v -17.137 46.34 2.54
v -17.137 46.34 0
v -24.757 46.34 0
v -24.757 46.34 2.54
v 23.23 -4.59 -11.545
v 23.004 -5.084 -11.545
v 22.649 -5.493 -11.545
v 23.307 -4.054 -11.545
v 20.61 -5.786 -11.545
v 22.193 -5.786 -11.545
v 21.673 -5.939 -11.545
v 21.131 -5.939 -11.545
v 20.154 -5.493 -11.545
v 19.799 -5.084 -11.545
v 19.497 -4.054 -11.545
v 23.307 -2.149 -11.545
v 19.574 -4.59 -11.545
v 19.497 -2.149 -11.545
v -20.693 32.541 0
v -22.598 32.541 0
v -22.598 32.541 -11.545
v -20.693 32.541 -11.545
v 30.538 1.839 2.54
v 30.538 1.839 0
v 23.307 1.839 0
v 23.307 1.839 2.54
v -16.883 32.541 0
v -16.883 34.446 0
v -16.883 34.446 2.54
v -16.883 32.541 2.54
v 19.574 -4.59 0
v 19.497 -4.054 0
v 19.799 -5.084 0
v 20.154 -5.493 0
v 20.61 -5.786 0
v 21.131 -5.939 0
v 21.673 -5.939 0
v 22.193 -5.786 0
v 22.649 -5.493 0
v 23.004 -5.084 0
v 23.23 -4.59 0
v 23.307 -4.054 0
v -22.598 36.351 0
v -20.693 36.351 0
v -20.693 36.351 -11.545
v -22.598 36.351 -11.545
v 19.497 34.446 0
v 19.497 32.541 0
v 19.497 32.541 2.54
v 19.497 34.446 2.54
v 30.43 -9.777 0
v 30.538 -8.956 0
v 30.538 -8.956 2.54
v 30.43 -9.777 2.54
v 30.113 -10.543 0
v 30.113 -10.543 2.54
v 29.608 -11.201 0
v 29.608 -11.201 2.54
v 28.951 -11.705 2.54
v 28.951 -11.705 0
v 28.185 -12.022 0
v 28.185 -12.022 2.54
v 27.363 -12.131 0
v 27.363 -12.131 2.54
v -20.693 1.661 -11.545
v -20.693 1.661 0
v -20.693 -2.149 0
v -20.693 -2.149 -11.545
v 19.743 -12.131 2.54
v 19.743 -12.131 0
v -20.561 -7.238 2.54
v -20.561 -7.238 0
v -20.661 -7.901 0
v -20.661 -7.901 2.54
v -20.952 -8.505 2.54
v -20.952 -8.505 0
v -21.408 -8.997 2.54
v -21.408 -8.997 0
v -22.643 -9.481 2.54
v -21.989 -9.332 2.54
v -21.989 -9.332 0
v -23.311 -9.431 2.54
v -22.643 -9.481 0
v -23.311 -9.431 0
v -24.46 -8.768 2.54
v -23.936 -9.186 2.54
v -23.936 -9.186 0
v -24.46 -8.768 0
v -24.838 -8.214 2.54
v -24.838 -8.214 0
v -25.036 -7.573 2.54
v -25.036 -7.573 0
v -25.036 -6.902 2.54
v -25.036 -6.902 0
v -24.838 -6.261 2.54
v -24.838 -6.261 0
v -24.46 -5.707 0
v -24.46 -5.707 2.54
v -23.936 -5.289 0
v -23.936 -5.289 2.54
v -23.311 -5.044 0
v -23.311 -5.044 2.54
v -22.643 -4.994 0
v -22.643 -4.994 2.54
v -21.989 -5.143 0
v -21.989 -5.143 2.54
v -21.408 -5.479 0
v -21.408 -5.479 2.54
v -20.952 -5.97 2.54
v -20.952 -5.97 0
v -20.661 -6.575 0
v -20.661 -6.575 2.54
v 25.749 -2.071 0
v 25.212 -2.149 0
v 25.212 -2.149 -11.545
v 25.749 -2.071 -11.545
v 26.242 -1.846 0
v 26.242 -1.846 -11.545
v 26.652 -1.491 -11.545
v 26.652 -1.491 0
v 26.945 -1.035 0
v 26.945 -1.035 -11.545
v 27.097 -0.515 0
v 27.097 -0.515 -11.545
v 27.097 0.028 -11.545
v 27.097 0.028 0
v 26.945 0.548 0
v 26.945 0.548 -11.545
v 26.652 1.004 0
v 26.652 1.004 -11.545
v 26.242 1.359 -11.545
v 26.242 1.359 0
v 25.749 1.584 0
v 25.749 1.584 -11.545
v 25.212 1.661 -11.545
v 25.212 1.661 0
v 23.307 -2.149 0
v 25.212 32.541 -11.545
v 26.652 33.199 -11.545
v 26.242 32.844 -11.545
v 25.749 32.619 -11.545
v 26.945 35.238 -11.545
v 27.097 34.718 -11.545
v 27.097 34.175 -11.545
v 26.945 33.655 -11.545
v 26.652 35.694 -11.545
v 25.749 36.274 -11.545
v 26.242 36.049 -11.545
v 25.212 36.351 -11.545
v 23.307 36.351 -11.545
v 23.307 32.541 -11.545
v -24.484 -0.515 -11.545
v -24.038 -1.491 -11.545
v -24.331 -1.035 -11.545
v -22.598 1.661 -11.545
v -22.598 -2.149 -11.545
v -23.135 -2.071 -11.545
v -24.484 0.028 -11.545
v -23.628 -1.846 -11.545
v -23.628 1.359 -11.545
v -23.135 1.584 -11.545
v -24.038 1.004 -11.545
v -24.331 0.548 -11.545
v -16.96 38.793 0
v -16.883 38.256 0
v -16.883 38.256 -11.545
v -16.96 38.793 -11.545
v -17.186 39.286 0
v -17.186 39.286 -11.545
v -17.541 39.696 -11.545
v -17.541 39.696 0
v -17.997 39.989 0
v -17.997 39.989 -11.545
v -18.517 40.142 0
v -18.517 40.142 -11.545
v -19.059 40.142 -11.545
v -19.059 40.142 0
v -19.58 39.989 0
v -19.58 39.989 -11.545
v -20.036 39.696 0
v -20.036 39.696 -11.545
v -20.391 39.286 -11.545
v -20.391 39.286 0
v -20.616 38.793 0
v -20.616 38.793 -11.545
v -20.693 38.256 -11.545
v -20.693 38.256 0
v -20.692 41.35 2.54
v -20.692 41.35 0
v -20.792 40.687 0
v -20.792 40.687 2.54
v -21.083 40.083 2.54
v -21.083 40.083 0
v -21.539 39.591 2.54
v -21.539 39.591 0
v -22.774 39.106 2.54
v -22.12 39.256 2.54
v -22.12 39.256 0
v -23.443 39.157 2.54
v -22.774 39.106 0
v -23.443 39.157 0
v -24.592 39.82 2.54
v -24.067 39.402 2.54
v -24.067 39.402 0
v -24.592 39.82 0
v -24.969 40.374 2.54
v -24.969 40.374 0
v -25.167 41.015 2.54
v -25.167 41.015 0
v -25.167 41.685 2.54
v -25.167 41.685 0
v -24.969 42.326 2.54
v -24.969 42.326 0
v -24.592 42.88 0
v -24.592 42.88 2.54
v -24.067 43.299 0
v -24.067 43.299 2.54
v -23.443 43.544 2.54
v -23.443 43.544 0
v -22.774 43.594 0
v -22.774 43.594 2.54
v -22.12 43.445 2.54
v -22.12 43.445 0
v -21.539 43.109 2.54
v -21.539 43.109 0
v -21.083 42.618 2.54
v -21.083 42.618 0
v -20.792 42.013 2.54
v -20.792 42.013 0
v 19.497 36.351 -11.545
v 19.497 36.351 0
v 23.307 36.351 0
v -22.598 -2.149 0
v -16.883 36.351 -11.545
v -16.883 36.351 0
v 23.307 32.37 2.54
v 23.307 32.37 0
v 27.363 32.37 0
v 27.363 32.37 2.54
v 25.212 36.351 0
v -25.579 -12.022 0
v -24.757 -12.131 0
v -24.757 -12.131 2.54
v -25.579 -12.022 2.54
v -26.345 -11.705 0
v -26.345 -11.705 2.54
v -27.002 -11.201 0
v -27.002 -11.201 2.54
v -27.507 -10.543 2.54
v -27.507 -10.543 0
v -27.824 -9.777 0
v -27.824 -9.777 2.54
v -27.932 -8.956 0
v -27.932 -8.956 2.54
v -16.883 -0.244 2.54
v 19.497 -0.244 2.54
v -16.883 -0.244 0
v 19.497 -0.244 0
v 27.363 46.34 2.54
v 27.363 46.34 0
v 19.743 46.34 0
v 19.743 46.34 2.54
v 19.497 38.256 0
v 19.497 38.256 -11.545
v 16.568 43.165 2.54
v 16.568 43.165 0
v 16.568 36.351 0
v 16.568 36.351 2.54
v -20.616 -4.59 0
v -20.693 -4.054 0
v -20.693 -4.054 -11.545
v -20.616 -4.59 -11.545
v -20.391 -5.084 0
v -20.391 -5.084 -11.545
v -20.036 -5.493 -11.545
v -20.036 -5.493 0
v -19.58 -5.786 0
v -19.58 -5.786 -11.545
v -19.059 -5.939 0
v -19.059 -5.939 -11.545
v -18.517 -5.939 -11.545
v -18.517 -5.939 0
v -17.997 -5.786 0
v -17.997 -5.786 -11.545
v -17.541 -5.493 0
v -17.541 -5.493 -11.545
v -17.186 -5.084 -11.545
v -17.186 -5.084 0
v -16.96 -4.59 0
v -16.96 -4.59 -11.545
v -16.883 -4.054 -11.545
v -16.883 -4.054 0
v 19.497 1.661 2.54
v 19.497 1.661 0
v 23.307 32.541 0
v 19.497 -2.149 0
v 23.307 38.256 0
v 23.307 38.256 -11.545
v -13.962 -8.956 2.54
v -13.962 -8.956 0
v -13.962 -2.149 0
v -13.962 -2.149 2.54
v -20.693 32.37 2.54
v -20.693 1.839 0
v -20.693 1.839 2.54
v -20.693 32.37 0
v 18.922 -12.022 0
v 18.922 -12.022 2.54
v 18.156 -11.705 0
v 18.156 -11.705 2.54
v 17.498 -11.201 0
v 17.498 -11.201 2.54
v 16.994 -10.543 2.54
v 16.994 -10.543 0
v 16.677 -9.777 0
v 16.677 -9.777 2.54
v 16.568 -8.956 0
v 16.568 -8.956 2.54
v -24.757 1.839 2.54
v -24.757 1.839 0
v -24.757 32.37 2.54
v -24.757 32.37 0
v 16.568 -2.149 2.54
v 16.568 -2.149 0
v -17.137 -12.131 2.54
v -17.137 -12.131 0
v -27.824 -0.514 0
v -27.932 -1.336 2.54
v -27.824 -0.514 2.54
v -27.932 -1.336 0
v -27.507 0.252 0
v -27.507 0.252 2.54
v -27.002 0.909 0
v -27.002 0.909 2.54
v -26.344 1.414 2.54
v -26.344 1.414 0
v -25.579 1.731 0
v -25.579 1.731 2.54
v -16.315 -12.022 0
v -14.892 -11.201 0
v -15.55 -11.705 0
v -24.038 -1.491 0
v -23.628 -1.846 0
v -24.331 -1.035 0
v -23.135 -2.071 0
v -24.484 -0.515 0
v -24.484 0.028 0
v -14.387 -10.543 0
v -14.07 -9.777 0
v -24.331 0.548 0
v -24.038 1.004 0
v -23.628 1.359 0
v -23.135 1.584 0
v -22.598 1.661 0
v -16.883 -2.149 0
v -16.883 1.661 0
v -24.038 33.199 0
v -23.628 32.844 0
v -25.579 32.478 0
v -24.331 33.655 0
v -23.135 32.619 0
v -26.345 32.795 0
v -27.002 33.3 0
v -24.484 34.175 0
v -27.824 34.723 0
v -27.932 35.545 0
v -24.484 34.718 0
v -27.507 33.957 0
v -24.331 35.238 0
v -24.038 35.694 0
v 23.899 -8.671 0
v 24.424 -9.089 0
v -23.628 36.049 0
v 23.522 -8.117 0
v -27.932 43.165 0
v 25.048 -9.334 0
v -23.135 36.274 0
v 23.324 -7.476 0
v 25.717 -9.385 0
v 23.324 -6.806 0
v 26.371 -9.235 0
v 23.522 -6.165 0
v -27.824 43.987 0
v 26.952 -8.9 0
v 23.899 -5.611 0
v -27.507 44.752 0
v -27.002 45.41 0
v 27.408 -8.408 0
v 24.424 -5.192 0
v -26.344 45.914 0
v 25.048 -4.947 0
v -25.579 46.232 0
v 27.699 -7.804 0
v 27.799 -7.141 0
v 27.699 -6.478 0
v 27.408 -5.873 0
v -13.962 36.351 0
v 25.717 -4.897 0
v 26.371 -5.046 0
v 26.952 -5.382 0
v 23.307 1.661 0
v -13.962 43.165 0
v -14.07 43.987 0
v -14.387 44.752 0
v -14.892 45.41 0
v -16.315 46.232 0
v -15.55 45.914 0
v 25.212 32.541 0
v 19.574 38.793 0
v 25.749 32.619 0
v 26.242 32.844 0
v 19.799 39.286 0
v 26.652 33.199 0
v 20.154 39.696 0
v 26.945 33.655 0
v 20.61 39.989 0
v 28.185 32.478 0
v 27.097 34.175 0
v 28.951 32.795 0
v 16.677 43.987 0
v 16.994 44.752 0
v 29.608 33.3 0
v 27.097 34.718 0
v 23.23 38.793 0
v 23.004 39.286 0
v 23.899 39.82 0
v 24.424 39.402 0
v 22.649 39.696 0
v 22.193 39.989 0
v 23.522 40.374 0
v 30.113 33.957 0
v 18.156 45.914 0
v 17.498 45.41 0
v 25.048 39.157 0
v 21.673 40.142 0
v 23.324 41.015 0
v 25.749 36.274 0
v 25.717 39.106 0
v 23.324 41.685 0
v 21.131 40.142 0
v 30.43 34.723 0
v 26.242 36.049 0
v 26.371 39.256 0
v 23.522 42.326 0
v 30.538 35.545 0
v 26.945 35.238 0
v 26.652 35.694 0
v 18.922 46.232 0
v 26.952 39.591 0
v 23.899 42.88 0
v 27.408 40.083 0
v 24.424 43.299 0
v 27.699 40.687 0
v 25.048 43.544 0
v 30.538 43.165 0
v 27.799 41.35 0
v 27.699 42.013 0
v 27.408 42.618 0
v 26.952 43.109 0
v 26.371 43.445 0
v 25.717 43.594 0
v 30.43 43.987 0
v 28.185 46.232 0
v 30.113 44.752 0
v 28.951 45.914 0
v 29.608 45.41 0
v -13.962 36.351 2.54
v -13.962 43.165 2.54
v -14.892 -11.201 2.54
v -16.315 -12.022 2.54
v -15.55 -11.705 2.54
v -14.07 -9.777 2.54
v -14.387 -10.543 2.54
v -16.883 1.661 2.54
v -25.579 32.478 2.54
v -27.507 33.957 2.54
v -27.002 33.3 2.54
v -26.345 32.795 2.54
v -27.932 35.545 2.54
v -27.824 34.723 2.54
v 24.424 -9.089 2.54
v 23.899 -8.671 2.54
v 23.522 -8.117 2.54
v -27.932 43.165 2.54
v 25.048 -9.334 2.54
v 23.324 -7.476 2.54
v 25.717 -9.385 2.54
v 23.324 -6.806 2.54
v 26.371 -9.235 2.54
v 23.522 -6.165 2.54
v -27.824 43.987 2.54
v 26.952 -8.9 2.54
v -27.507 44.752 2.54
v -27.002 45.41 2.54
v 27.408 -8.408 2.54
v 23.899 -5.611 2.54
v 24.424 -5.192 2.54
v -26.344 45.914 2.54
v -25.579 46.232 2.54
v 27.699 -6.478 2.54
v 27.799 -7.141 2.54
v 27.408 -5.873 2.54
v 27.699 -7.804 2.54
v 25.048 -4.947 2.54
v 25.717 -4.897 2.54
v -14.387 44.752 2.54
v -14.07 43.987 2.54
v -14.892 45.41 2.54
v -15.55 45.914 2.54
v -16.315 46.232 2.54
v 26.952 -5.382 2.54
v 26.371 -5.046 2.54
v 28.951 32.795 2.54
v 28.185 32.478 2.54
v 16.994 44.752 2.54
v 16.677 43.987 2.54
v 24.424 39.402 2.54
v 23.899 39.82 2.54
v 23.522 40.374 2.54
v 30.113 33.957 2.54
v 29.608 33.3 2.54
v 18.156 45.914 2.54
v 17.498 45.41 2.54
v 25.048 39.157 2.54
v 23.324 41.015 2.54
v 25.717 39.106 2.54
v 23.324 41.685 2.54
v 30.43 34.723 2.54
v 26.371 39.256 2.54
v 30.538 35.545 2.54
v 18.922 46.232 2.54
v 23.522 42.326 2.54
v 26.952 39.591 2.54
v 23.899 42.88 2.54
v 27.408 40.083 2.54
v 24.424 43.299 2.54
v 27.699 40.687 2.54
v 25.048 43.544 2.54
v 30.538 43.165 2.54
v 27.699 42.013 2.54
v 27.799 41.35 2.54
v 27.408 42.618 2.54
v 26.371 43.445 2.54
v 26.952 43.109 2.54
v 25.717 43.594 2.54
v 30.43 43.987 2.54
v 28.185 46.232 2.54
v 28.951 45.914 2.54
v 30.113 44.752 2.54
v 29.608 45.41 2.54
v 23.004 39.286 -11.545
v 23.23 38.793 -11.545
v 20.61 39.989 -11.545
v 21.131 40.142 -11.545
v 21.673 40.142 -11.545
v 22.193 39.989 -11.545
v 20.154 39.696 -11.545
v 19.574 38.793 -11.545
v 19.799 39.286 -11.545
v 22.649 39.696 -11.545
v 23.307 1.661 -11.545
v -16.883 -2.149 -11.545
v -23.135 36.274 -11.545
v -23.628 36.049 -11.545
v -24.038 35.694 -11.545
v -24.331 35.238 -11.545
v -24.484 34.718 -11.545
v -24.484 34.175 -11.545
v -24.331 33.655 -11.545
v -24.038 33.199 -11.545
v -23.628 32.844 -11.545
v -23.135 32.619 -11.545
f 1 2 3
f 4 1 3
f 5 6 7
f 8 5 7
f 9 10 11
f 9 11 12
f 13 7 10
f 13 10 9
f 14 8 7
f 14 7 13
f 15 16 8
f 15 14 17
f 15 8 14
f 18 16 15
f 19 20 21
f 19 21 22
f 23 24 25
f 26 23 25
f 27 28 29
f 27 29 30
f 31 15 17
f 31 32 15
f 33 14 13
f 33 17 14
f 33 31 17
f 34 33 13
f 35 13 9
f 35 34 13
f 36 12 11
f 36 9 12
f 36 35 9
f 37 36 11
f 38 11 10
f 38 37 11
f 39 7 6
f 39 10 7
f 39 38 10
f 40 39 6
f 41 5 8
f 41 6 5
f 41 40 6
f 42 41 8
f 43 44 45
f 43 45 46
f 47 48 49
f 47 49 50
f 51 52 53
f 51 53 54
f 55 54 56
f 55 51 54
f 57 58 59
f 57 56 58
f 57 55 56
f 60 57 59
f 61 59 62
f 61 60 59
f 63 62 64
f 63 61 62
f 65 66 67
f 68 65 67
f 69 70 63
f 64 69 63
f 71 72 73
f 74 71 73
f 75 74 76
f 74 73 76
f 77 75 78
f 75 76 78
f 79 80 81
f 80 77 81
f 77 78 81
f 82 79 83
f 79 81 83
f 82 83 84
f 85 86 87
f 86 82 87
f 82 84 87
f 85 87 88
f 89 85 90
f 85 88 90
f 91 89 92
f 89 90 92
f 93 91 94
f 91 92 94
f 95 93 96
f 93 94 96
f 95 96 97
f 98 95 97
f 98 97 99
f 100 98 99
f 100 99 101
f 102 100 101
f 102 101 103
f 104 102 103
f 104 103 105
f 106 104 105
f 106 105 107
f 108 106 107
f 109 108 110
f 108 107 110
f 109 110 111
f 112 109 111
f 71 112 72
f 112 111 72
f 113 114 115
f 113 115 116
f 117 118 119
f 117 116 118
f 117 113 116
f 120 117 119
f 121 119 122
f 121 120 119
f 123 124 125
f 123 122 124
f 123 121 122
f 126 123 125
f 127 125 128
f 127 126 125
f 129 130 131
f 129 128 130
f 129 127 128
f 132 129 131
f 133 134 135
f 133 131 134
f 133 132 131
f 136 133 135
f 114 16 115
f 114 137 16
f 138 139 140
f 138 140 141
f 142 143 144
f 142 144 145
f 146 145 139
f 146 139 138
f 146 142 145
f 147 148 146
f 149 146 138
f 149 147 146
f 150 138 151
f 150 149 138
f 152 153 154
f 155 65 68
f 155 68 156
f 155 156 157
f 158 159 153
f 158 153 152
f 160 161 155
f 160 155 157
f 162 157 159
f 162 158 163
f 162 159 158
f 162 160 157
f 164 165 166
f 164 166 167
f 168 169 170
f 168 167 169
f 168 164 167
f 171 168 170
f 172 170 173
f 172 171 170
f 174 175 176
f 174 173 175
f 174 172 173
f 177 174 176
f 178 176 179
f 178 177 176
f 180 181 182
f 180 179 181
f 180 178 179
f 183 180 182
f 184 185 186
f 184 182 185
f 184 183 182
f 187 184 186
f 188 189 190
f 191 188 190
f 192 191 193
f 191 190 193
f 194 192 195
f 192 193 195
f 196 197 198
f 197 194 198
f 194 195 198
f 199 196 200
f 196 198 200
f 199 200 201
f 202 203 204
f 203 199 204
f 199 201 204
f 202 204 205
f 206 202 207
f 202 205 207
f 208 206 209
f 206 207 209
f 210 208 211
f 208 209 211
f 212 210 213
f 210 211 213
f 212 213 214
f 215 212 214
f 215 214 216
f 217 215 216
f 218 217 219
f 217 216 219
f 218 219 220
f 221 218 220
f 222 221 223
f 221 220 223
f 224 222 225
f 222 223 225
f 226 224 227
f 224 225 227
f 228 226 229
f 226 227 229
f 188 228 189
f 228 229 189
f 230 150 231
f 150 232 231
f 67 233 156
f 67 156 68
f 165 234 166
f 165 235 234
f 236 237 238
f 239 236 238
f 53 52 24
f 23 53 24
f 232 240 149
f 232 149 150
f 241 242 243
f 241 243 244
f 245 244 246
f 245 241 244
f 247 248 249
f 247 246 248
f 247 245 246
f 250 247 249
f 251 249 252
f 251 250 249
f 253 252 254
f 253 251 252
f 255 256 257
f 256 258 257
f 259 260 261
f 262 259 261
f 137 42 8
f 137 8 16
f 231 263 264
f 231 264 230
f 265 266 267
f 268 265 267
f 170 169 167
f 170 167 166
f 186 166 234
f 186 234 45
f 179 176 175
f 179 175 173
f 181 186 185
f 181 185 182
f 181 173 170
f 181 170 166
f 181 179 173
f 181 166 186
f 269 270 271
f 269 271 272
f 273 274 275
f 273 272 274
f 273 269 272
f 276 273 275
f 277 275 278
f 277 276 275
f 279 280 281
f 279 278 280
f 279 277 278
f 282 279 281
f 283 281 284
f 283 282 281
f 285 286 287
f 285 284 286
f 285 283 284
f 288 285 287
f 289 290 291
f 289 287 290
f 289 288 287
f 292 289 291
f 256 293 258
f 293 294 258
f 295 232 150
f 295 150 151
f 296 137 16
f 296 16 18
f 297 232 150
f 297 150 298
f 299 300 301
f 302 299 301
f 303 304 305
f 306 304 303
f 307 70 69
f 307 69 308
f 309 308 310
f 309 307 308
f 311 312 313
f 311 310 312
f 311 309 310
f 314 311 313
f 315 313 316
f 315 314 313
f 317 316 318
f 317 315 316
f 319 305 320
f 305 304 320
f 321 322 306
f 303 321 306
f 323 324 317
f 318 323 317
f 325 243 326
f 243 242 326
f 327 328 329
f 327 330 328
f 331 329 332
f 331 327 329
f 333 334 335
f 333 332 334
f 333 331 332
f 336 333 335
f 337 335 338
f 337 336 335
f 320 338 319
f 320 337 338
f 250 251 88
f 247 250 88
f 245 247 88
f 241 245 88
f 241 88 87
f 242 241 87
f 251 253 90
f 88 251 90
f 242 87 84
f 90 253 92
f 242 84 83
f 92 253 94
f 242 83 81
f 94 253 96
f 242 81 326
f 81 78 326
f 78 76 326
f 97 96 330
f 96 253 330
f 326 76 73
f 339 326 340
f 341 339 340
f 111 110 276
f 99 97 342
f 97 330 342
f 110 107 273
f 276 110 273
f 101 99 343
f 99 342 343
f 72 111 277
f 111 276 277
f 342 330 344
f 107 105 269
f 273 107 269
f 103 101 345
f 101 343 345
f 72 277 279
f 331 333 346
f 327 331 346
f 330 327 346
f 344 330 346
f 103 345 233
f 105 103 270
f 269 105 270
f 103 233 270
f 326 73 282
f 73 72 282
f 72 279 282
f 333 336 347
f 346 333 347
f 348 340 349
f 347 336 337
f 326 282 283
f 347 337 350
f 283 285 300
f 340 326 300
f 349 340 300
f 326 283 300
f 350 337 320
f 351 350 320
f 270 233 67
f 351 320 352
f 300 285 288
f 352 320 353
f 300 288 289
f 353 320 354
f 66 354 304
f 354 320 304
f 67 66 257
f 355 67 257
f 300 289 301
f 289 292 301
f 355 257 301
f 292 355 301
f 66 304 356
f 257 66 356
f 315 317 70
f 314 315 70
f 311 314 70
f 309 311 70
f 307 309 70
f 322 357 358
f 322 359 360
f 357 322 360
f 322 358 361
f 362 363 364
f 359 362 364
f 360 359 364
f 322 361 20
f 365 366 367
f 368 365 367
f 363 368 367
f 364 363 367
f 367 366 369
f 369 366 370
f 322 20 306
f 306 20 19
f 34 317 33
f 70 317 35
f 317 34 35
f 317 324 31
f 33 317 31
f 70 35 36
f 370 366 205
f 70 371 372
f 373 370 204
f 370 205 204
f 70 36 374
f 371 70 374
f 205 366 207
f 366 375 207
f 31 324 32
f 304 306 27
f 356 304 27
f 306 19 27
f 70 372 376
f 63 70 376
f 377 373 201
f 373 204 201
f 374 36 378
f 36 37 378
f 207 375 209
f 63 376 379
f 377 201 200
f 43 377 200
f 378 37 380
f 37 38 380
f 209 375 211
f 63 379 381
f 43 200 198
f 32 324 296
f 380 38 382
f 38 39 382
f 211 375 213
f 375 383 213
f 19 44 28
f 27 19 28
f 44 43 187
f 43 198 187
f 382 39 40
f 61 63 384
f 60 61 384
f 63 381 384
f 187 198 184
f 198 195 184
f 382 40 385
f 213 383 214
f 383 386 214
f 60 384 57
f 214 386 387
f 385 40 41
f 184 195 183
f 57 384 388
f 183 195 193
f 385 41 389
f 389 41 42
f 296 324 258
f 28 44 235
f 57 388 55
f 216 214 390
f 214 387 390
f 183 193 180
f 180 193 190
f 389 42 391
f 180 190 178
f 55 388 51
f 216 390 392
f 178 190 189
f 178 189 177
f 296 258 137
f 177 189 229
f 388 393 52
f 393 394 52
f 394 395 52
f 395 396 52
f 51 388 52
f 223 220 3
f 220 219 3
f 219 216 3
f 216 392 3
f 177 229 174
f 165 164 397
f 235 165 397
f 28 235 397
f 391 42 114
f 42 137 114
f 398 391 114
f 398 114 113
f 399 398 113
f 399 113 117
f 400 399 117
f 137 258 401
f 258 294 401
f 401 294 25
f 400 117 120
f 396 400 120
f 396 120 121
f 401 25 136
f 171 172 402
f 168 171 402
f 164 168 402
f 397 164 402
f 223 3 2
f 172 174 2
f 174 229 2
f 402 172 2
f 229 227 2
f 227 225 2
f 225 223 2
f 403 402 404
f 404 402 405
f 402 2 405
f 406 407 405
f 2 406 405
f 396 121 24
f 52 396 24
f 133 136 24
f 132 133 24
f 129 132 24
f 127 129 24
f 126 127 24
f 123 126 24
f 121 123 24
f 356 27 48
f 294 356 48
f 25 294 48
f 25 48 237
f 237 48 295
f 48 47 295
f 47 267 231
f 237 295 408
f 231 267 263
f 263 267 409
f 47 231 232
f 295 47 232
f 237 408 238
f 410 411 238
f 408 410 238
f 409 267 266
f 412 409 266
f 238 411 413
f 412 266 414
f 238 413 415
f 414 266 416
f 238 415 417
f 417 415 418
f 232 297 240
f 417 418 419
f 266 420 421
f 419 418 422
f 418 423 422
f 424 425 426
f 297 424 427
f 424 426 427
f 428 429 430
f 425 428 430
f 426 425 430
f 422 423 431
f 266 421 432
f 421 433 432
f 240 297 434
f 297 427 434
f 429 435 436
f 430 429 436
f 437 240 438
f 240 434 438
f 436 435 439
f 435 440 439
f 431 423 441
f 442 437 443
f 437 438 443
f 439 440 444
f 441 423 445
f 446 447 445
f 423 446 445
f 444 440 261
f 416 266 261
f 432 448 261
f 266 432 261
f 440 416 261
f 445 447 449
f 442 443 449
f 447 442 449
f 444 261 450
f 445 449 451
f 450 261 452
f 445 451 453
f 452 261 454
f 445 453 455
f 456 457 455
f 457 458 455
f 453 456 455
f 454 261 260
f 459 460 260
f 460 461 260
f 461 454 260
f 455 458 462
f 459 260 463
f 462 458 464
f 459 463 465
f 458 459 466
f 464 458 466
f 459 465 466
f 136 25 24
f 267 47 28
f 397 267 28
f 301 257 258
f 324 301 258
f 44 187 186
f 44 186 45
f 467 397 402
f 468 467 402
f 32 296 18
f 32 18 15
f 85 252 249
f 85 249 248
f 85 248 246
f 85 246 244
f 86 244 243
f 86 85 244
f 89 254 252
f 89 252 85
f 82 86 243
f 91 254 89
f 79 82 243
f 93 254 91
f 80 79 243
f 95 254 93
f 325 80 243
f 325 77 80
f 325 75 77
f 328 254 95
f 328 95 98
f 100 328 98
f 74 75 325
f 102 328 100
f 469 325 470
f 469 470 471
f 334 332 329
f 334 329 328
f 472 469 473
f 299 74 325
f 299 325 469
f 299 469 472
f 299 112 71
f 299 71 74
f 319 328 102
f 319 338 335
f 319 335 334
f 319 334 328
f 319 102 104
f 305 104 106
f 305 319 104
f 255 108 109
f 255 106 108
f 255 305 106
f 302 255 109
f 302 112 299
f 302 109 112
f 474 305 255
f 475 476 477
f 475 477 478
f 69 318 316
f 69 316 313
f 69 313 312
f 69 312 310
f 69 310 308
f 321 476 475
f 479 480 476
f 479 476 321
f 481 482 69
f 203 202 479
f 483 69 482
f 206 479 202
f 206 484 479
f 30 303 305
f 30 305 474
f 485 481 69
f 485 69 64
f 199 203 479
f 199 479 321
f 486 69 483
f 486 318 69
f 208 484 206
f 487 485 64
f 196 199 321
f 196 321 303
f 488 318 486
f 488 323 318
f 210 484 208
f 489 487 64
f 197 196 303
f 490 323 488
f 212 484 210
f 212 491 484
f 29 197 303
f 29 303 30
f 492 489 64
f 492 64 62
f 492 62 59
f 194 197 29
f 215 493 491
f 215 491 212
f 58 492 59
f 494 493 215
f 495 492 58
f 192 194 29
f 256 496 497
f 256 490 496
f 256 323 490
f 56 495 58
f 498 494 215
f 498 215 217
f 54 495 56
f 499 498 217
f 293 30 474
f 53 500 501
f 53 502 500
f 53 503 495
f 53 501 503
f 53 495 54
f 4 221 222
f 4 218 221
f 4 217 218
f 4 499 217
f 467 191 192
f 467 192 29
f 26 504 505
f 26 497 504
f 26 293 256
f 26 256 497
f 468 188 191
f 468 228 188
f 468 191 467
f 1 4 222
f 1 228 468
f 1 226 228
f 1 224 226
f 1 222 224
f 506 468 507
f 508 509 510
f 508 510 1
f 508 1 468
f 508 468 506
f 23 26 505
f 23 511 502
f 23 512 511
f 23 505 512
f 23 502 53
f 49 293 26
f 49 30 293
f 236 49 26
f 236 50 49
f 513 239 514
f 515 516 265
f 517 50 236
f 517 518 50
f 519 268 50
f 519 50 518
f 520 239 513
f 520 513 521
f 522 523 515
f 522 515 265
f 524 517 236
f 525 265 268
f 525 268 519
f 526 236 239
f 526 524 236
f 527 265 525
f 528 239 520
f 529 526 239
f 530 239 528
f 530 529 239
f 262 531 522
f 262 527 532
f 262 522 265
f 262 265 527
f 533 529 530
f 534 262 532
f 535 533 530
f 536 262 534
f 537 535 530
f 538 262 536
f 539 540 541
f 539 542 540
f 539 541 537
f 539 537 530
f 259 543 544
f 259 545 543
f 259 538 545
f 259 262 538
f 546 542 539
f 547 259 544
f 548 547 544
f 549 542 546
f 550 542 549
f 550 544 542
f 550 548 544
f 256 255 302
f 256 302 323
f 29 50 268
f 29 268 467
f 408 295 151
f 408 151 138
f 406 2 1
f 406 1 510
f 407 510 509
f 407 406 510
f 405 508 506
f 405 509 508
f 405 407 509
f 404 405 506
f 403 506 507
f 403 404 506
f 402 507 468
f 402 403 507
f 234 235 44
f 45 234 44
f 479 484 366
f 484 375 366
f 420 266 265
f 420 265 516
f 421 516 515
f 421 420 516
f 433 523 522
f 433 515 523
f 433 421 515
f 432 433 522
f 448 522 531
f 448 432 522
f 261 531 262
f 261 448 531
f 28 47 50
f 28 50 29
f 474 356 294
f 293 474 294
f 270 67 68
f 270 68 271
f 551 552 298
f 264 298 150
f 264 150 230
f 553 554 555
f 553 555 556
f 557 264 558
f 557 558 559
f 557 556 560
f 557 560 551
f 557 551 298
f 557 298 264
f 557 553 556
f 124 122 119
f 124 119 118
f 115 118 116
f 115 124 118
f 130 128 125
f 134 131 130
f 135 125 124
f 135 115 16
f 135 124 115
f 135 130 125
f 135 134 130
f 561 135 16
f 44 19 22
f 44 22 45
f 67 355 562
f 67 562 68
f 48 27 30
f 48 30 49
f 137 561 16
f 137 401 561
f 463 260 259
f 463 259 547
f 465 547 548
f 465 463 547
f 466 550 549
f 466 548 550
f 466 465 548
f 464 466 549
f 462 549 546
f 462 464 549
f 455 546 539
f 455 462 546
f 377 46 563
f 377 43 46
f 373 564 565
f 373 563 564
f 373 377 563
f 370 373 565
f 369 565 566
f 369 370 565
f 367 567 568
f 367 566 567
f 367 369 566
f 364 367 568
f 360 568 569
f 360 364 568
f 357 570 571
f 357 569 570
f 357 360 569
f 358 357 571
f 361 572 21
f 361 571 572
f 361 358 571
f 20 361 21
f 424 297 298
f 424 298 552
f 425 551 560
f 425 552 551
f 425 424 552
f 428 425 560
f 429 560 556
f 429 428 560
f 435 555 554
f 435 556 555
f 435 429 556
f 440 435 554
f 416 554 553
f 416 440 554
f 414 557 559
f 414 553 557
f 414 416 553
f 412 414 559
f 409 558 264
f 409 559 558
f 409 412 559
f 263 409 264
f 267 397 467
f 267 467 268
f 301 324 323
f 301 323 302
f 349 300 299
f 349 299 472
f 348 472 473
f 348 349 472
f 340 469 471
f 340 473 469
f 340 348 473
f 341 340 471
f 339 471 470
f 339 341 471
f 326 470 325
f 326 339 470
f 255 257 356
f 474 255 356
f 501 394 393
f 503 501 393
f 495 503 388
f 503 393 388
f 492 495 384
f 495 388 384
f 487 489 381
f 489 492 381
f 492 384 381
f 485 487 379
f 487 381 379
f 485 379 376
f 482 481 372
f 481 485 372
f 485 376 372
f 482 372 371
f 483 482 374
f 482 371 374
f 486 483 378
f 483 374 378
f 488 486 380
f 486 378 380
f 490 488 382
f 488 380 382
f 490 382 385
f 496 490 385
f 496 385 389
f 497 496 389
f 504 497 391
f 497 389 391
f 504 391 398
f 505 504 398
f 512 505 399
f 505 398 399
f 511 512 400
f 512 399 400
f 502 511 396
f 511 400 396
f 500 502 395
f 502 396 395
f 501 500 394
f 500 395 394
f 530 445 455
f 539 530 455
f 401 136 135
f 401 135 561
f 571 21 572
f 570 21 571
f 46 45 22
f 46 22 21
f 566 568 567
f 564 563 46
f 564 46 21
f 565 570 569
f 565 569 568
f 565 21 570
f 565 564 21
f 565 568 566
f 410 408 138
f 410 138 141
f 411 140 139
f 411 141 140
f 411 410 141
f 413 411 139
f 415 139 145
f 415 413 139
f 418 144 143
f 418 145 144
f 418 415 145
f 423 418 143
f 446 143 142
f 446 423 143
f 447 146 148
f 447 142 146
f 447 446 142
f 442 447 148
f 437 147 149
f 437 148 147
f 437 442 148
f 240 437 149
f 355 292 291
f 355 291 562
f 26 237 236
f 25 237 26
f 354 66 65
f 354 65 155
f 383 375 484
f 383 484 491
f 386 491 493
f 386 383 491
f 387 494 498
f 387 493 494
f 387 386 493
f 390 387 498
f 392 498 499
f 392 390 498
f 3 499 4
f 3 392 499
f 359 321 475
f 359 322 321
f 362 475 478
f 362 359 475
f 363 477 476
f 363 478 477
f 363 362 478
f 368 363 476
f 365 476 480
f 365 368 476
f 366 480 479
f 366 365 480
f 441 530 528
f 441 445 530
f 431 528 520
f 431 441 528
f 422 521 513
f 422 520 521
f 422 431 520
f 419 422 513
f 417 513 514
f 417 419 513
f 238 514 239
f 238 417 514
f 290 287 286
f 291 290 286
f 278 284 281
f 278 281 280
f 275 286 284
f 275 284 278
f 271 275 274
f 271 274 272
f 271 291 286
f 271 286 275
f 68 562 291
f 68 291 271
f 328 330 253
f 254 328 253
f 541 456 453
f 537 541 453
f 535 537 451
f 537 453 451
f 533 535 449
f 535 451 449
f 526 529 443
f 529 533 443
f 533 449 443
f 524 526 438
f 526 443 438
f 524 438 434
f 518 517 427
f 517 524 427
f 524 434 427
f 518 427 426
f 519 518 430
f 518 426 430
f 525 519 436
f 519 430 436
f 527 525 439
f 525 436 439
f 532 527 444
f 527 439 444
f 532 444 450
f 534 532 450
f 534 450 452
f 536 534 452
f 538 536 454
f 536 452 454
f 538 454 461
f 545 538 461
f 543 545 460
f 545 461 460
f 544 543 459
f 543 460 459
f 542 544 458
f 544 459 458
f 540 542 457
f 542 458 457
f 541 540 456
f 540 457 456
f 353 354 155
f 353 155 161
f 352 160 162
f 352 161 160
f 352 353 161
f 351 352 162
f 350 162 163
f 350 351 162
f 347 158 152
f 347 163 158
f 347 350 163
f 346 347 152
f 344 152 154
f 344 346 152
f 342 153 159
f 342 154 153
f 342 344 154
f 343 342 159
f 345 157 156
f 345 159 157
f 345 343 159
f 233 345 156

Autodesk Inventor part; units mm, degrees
ref_plane "YZ Plane" through (0, 0, 0) normal (1, 0, 0) x (0, 1, 0)
ref_plane "XZ Plane" through (0, 0, 0) normal (0, 1, 0) x (-1, 0, 0)
ref_plane "XY Plane" through (0, 0, 0) normal (0, 0, 1) x (1, 0, 0)
ref_plane "Work Plane1" through (1.3068, 17.1014, 0) normal (0, 0, 1) x (1, 0, 0)
sketch "Sketch2" plane through (1.3068, 17.1014, 0) normal (0, 0, 1) x (1, 0, 0)
  line L0 (-22, -19.25) -> (-22, 19.25)
  line L1 (-22, 19.25) -> (22, 19.25)
  line L2 (22, -19.25) -> (-22, -19.25)
  line L3 (-22, 19.25) -> (22, 19.25)
  line L4 (22, 19.25) -> (22, -19.25)
  line L5 (-22, 19.25) -> (22, 19.25)
  line L6 (-22, 19.25) -> (-18.19, 19.25)
  line L7 (-22, 15.44) -> (-22, 19.25)
  line L8 (-22, -19.25) -> (-18.19, -19.25)
  line L9 (22, -19.25) -> (18.19, -19.25)
  line L10 (22, -15.44) -> (22, -19.25)
  line L11 (22, 15.44) -> (22, 19.25)
  line L12 (22, 19.25) -> (18.19, 19.25)
  line L13 (18.19, 17.345) -> (-18.19, 17.345)
  line L14 (-18.19, 17.345) -> (-18.19, 15.44)
  line L15 (-18.19, 15.44) -> (18.19, 15.44)
  line L16 (18.19, 15.44) -> (18.19, 17.345)
  line L17 (18.19, -17.345) -> (-18.19, -17.345)
  line L18 (-18.19, -17.345) -> (-18.19, -15.44)
  line L19 (-18.19, -15.44) -> (18.19, -15.44)
  line L20 (18.19, -15.44) -> (18.19, -17.345)
  circle A0 centre (-24.1175, -24.3391) radius 2.25 projected
  circle A1 centre (-24.2491, 24.2487) radius 2.25 projected
  circle A2 centre (24.2419, 24.2487) radius 2.25 projected
  circle A3 centre (24.2419, -24.2423) radius 2.25 projected
  line L21 (15.2616, -22.247) -> (15.2616, -26.057) projected
  arc A4 (15.2616, -26.057) -> (18.4366, -29.232) centre (18.4366, -26.057) ccw projected
  line L22 (18.4366, -29.232) -> (26.0566, -29.232) projected
  arc A5 (26.0566, -29.232) -> (29.2316, -26.057) centre (26.0566, -26.057) ccw projected
  line L23 (29.2316, -26.057) -> (29.2316, -15.262) projected
  line L24 (29.2316, -15.262) -> (18.3723, -15.262) projected
  line L25 (18.3723, 15.2684) -> (26.0566, 15.2684) projected
  arc A6 (26.0566, 15.2684) -> (29.2316, 18.4434) centre (26.0566, 18.4434) ccw projected
  line L26 (29.2316, 18.4434) -> (29.2316, 26.0634) projected
  arc A7 (29.2316, 26.0634) -> (26.0566, 29.2384) centre (26.0566, 26.0634) ccw projected
  line L27 (26.0566, 29.2384) -> (18.4366, 29.2384) projected
  line L28 (15.2616, 26.0634) -> (15.2616, 22.2534) projected
  arc A8 (18.4366, 29.2384) -> (15.2616, 26.0634) centre (18.4366, 26.0634) ccw projected
  line L29 (-26.0638, 15.2684) -> (-15.2688, 15.2684) projected
  arc A9 (-29.2388, 18.4434) -> (-26.0638, 15.2684) centre (-26.0638, 18.4434) ccw projected
  line L30 (-29.2388, 26.0634) -> (-29.2388, 18.4434) projected
  arc A10 (-26.0638, 29.2384) -> (-29.2388, 26.0634) centre (-26.0638, 26.0634) ccw projected
  line L31 (-18.4438, 29.2384) -> (-26.0638, 29.2384) projected
  arc A11 (-15.2688, 26.0634) -> (-18.4438, 29.2384) centre (-18.4438, 26.0634) ccw projected
  line L32 (-15.2688, 22.2534) -> (-15.2688, 26.0634) projected
  line L33 (-15.2688, -26.057) -> (-15.2688, -22.247) projected
  arc A12 (-18.4438, -29.232) -> (-15.2688, -26.057) centre (-18.4438, -26.057) ccw projected
  line L34 (-26.0638, -29.232) -> (-18.4438, -29.232) projected
  arc A13 (-29.2388, -26.057) -> (-26.0638, -29.232) centre (-26.0638, -26.057) ccw projected
  line L35 (-29.2388, -18.437) -> (-29.2388, -26.057) projected
  arc A14 (-26.0638, -15.262) -> (-29.2388, -18.437) centre (-26.0638, -18.437) ccw projected
  line L36 (-15.2688, -15.262) -> (-26.0638, -15.262) projected
  line L37 (-15.2688, -22.247) -> (-15.2688, -19.25)
  line L38 (15.2616, -22.247) -> (15.2616, -19.25)
  line L39 (15.2616, 22.2534) -> (15.2616, 19.25)
  line L40 (-15.2688, 22.2534) -> (-15.2688, 19.25)
  point P0 (-1.3068, -17.1014)
  point P1 (0, 0)
  point P2 (22, -15.262)
  point P3 (18.19, -19.25)
  point P4 (15.2616, 19.25)
  point P5 (22, 15.2684)
  point P6 (-22, 15.2684)
  point P7 (-22, -15.262)
extrude "Extrusion2" add sketch "Sketch2" along normal blind 2.54
sketch "Sketch4" plane through (1.3068, 17.1014, 0) normal (0, 0, -1) x (-1, 0, 0)
  line L0 (22, 21.155) -> (22, 19.25) projected
  arc A0 (22, 21.155) -> (18.19, 21.155) centre (20.095, 21.155) ccw projected
  line L1 (18.19, 19.25) -> (18.19, 21.155) projected
  line L2 (22, 19.25) -> (23.905, 19.25) projected
  arc A1 (23.905, 15.44) -> (23.905, 19.25) centre (23.905, 17.345) ccw projected
  line L3 (23.905, 15.44) -> (22, 15.44) projected
  line L4 (-23.905, 19.25) -> (-22, 19.25) projected
  arc A2 (-23.905, 19.25) -> (-23.905, 15.44) centre (-23.905, 17.345) ccw projected
  line L5 (-22, 15.44) -> (-23.905, 15.44) projected
  line L6 (-22, 19.25) -> (-22, 21.155) projected
  arc A3 (-18.19, 21.155) -> (-22, 21.155) centre (-20.095, 21.155) ccw projected
  line L7 (-18.19, 21.155) -> (-18.19, 19.25) projected
  line L8 (-23.905, -15.44) -> (-22, -15.44) projected
  arc A4 (-23.905, -15.44) -> (-23.905, -19.25) centre (-23.905, -17.345) ccw projected
  line L9 (-22, -19.25) -> (-23.905, -19.25) projected
  line L10 (-22, -21.155) -> (-22, -19.25) projected
  arc A5 (-22, -21.155) -> (-18.19, -21.155) centre (-20.095, -21.155) ccw projected
  line L11 (-18.19, -19.25) -> (-18.19, -21.155) projected
  line L12 (18.19, -21.155) -> (18.19, -19.25) projected
  arc A6 (18.19, -21.155) -> (22, -21.155) centre (20.095, -21.155) ccw projected
  line L13 (22, -19.25) -> (22, -21.155) projected
  line L14 (23.905, -19.25) -> (22, -19.25) projected
  line L15 (22, -15.44) -> (23.905, -15.44) projected
  arc A7 (23.905, -19.25) -> (23.905, -15.44) centre (23.905, -17.345) ccw projected
  line L16 (22, -15.44) -> (22, -19.25)
  line L17 (18.19, -19.25) -> (22, -19.25)
  line L18 (-22, -19.25) -> (-18.19, -19.25)
  line L19 (-22, -15.44) -> (-22, -19.25)
  line L20 (-22, 19.25) -> (-22, 15.44)
  line L21 (-22, 19.25) -> (-18.19, 19.25)
  line L22 (18.19, 19.25) -> (22, 19.25)
  line L23 (22, 21.155) -> (22, 19.25) projected
  line L24 (22, 15.44) -> (22, 19.25)
  point P0 (1.3068, -17.1014)
extrude "Extrusion3" add sketch "Sketch4" along normal blind 11.545
properties part number "cover" material "ABS Plastic"
